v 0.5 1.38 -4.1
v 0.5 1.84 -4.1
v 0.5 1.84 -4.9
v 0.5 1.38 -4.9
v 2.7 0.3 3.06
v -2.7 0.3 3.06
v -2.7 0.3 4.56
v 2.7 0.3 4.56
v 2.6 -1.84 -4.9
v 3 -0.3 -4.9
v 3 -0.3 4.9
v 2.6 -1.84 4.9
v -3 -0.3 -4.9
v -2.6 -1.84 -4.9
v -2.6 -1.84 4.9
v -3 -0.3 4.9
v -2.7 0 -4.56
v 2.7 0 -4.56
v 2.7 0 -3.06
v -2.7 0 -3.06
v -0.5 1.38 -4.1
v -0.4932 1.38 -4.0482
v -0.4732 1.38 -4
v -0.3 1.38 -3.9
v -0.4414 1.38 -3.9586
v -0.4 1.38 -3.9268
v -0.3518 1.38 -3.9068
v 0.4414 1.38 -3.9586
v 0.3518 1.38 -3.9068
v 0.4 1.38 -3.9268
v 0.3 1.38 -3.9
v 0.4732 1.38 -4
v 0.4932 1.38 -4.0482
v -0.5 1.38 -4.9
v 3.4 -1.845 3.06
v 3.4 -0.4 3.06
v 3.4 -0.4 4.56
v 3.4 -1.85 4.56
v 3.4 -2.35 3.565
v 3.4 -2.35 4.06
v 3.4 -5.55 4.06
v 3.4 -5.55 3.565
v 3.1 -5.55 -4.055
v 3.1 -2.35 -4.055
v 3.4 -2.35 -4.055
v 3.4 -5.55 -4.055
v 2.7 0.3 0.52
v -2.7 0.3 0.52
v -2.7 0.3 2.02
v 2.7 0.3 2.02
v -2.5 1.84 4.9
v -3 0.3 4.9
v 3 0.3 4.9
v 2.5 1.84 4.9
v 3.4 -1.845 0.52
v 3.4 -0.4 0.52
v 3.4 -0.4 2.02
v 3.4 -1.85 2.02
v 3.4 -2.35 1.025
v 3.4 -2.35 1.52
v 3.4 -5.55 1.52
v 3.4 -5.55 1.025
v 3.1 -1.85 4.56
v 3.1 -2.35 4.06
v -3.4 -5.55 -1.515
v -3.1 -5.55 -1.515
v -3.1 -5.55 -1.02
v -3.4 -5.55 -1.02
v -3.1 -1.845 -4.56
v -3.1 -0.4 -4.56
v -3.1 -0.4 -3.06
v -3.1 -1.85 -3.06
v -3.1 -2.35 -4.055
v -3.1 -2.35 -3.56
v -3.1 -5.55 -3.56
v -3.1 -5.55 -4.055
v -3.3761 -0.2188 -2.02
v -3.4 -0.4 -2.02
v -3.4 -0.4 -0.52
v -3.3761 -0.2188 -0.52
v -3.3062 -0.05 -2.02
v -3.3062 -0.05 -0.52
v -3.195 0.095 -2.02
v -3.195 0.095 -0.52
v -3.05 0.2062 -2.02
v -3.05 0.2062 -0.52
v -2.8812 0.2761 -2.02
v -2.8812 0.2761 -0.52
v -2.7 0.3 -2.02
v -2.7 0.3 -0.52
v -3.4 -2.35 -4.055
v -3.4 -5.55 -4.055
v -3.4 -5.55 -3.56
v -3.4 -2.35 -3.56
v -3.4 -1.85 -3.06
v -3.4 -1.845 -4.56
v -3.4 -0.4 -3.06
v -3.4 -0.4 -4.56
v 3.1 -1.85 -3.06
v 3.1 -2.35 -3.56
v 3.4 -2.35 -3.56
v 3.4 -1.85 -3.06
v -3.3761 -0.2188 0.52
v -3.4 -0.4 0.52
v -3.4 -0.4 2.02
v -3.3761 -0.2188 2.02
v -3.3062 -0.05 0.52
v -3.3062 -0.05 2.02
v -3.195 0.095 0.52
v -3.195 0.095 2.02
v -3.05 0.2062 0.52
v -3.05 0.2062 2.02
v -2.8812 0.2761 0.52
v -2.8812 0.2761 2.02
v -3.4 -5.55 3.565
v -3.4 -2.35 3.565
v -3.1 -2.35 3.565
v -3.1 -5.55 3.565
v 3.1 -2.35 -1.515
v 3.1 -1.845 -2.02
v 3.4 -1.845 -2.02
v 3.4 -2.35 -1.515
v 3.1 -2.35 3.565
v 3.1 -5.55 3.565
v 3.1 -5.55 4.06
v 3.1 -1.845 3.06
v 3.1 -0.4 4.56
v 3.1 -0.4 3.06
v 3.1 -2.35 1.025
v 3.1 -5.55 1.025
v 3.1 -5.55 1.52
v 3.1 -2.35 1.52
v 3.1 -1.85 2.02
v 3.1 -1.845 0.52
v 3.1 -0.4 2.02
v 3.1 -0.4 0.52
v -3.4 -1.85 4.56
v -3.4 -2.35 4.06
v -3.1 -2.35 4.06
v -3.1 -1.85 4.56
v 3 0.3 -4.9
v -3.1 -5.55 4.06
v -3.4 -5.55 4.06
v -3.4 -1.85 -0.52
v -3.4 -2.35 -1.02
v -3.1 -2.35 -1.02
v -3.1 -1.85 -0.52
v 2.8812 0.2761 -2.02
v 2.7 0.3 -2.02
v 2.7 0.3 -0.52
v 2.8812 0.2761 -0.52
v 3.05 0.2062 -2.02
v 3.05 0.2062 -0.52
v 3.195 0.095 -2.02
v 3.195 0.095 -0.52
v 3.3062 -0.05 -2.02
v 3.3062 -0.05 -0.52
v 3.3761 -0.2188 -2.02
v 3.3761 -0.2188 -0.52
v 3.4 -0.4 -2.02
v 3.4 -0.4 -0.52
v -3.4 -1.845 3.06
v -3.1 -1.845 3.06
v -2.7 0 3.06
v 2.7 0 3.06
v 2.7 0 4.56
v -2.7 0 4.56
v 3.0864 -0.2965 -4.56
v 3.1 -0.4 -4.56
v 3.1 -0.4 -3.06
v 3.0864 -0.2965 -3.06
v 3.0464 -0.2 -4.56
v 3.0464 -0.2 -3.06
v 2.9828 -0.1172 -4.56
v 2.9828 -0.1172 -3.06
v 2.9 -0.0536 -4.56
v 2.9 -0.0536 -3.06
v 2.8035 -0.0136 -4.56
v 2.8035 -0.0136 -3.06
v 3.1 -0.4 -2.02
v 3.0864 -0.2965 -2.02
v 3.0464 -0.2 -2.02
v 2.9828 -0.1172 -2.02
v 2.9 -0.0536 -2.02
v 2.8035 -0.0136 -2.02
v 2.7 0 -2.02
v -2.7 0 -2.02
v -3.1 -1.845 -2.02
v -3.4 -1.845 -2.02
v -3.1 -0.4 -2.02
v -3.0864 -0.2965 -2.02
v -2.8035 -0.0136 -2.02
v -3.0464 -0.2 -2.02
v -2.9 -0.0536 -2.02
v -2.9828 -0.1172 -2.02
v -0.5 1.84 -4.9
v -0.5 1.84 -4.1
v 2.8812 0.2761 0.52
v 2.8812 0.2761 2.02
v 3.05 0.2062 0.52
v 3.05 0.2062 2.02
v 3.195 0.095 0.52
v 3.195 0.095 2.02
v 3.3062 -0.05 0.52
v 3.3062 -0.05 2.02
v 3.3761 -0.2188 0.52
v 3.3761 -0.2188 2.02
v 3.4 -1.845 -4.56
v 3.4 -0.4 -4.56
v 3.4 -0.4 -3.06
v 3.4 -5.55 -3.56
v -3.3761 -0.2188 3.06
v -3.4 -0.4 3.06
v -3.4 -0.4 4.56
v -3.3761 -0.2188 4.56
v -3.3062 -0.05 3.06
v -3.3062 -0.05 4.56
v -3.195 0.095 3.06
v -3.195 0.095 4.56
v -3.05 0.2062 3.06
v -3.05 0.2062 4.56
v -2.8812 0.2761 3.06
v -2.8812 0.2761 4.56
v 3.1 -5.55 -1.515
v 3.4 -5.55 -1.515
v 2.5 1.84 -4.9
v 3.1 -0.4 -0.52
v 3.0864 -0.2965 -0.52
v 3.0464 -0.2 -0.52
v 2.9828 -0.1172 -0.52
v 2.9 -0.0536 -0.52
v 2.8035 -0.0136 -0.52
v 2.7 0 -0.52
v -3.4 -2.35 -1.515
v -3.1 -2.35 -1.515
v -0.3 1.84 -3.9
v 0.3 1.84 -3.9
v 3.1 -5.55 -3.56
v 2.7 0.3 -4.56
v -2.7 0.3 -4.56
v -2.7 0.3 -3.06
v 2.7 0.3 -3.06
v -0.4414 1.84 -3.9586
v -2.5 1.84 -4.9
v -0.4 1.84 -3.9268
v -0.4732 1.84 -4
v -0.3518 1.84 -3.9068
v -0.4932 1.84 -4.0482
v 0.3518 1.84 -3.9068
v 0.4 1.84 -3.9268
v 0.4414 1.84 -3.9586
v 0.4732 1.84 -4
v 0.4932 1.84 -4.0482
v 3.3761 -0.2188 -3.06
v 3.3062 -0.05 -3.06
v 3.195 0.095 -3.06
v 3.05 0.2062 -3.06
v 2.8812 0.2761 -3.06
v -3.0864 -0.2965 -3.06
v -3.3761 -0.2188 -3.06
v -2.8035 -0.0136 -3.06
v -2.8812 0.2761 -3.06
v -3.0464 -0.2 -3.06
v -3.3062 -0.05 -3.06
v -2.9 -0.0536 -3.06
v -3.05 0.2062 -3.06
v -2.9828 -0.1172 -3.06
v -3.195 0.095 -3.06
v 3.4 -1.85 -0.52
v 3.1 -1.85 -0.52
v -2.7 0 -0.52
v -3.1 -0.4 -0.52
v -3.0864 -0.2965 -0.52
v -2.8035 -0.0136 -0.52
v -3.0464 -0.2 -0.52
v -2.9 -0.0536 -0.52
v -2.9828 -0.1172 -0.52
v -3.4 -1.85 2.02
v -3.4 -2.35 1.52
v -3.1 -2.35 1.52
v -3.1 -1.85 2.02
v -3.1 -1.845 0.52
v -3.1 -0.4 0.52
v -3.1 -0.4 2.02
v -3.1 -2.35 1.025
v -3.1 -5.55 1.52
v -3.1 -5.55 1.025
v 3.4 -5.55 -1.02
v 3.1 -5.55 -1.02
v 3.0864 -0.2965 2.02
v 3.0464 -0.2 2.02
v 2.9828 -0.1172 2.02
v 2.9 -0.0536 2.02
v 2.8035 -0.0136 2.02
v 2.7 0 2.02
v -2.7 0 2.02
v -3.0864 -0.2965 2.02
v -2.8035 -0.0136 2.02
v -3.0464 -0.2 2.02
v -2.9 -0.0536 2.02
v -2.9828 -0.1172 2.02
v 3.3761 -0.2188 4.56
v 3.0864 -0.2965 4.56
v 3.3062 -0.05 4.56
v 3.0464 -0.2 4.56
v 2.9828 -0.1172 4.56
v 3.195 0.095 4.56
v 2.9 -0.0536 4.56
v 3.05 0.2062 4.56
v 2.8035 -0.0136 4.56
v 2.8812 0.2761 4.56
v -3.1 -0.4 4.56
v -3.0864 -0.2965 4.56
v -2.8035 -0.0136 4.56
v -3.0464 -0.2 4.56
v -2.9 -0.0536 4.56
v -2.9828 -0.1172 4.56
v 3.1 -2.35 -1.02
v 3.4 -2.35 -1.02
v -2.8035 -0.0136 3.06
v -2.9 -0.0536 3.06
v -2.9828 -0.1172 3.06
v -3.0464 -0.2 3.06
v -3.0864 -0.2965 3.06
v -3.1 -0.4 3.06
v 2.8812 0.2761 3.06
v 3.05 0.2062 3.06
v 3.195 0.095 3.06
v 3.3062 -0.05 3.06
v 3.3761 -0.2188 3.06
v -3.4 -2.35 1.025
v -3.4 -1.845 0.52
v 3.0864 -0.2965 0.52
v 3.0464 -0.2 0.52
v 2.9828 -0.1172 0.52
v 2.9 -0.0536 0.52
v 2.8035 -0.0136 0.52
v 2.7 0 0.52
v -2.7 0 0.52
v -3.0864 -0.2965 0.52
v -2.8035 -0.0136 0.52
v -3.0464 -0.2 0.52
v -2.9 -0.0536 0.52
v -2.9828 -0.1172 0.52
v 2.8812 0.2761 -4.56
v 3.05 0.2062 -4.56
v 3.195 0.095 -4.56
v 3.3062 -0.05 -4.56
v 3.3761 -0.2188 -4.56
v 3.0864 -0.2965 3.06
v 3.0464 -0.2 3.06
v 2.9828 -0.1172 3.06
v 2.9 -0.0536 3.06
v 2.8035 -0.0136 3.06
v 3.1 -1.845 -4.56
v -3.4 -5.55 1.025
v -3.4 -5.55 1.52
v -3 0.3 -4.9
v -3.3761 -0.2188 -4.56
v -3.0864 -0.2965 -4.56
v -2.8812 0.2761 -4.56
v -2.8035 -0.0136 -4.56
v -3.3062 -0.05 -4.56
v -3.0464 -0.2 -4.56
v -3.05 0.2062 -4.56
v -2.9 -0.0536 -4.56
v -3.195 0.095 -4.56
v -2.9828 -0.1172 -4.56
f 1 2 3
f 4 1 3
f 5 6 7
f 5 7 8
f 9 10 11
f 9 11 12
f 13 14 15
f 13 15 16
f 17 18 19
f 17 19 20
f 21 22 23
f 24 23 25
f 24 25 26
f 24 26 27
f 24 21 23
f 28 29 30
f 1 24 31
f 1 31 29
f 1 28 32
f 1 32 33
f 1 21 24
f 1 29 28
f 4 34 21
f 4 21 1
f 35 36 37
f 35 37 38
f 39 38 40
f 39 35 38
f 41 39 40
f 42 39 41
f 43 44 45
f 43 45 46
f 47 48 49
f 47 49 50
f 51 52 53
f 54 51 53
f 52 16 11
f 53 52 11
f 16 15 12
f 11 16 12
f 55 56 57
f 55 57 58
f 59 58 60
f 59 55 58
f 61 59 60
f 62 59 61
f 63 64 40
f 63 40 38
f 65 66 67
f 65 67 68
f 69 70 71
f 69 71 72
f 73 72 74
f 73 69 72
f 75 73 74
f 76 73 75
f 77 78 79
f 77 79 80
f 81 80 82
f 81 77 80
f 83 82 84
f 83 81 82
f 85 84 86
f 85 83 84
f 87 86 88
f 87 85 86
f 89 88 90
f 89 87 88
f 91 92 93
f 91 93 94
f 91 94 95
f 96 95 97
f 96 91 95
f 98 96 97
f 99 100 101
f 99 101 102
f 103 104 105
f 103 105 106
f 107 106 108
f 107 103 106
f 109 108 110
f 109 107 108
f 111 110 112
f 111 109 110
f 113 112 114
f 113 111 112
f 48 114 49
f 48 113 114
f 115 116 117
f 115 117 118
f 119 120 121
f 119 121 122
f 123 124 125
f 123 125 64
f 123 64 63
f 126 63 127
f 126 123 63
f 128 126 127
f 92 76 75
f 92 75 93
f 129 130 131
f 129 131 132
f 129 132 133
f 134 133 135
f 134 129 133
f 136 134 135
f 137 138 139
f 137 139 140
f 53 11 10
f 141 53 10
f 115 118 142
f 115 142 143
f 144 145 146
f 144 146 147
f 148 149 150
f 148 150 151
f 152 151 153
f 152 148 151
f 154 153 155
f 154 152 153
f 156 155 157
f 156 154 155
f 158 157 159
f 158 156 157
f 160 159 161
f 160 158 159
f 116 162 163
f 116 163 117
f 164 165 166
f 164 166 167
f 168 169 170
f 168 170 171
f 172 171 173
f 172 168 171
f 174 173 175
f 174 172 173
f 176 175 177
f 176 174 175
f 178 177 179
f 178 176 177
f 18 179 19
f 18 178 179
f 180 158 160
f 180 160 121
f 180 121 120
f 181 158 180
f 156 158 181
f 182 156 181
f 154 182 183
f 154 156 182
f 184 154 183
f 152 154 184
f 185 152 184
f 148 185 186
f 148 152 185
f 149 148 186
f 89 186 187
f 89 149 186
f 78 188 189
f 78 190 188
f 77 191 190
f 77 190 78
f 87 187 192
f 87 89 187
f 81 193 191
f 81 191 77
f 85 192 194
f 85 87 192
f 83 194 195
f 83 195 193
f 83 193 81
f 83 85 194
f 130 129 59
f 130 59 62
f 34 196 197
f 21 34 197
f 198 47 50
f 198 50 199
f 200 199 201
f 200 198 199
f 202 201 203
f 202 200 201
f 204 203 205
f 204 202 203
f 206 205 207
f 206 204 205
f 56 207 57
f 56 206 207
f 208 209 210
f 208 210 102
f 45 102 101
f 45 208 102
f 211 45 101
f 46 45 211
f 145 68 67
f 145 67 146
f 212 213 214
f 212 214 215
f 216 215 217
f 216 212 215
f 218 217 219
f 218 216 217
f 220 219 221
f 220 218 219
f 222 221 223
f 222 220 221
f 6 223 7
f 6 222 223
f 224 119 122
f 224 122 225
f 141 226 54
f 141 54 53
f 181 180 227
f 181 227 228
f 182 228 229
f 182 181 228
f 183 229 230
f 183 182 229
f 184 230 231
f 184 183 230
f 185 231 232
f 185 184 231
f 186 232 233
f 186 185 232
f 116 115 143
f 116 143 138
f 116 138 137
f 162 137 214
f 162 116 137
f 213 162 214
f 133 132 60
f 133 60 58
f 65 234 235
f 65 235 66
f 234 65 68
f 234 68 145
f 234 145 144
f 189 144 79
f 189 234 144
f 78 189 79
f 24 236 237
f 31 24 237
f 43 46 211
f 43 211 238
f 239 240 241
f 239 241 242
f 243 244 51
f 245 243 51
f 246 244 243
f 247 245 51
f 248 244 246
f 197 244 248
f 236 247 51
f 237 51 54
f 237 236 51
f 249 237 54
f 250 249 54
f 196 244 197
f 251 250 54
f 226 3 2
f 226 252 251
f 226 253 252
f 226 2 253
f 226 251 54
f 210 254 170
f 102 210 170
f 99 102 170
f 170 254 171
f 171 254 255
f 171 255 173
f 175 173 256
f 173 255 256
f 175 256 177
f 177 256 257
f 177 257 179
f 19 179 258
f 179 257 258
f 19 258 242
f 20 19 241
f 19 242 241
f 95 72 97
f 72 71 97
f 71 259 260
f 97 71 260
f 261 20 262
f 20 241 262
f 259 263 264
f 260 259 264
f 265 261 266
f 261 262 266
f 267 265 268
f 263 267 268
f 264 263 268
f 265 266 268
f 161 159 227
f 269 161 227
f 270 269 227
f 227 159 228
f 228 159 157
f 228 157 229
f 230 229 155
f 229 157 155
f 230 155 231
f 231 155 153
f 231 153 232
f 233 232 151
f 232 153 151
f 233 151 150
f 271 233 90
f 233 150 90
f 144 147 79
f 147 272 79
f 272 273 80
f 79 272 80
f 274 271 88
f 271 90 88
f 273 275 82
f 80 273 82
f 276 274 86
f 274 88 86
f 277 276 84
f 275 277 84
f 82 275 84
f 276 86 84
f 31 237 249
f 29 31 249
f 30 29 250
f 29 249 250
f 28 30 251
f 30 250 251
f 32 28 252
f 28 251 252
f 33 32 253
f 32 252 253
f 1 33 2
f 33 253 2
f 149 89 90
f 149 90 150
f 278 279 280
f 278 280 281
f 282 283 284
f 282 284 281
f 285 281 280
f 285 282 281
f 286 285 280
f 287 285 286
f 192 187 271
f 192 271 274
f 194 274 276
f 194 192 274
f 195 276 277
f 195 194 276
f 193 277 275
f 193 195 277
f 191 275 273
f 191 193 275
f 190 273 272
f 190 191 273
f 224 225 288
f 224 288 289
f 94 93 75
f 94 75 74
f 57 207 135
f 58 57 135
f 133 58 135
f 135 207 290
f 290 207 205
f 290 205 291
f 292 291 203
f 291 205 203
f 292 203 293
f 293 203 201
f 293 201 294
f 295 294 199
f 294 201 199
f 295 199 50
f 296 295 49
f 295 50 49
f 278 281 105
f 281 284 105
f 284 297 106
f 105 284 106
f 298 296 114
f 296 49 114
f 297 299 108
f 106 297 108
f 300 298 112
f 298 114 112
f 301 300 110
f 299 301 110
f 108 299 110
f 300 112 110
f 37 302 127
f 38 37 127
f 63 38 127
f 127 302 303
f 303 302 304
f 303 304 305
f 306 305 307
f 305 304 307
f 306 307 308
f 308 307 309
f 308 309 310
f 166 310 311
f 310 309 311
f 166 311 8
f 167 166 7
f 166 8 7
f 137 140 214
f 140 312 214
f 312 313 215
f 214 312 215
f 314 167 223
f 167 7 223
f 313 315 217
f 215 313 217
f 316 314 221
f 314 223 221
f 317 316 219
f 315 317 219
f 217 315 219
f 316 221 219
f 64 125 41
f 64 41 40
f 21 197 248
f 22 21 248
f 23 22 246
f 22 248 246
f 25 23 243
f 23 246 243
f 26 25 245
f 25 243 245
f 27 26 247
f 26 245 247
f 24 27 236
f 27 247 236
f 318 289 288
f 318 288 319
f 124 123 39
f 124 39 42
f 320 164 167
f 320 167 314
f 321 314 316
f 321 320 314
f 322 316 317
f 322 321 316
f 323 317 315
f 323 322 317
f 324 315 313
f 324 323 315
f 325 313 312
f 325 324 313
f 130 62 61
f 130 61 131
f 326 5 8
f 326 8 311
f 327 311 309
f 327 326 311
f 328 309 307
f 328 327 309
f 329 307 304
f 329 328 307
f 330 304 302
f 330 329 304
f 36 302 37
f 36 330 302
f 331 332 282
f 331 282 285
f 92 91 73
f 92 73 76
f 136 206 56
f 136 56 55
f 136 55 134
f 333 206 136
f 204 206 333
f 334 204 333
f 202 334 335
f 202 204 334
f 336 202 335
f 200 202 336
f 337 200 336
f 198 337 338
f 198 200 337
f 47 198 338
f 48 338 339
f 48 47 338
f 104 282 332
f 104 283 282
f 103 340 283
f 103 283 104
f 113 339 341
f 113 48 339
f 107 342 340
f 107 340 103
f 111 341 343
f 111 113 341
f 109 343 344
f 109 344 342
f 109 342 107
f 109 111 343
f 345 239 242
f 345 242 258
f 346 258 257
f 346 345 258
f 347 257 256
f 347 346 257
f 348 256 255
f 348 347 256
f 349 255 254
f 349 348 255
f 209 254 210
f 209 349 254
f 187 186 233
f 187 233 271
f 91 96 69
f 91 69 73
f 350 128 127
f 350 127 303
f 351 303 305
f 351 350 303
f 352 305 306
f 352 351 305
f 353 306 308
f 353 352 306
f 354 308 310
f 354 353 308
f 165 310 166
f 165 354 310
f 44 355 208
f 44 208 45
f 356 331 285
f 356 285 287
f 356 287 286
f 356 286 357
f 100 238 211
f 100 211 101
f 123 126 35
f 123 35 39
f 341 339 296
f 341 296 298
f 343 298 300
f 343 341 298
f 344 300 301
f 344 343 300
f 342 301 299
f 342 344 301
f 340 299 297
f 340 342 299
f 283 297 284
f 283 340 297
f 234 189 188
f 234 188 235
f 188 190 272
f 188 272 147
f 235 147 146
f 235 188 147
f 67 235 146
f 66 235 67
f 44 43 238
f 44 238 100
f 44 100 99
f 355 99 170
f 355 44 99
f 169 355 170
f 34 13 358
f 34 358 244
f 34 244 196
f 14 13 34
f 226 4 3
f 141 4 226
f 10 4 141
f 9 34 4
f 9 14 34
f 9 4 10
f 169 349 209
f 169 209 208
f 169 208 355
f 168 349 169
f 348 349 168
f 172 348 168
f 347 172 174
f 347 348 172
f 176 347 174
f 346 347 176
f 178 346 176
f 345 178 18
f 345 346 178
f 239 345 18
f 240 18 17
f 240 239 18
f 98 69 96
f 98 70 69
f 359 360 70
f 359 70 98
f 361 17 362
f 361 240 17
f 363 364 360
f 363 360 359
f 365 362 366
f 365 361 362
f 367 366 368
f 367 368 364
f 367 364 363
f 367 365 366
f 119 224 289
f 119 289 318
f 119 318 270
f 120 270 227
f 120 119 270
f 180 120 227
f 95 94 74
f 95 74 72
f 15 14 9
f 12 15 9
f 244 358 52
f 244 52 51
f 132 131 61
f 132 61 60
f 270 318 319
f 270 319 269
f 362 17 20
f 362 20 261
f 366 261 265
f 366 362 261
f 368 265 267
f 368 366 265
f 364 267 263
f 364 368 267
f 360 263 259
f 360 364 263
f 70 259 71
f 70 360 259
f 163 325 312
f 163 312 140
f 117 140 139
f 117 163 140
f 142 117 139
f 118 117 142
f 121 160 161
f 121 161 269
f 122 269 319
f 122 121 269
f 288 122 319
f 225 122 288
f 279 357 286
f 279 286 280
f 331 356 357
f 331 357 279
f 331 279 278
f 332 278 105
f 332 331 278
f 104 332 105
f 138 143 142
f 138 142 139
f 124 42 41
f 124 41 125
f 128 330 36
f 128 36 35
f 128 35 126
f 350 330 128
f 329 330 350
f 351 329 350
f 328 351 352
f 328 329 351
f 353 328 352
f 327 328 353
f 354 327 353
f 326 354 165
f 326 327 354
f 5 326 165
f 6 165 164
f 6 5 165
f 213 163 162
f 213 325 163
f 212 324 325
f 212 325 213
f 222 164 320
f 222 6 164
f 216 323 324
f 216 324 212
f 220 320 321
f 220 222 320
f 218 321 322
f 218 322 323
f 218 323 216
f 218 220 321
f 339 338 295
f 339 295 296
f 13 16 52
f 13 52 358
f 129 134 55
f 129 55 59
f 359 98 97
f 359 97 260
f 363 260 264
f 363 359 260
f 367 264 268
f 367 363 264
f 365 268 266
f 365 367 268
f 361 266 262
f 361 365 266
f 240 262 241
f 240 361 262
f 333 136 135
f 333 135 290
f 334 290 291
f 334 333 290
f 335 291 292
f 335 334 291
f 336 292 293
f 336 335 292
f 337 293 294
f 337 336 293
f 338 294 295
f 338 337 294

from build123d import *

# Parameters (mm, degrees)
BODY_FEATURE_DEPTH                    = 1.84
BODY_FEATURE_DEPTH_BACK               = 1.84
SKETCH1_W                             = 6
SKETCH1_H                             = 9.8
BEVEL_FEATURE_DEPTH                   = 9.8
BEVEL_FEATURE_DEPTH_BACK              = 9.8
SIGN_FEATURE_DEPTH                    = 0.46
FIRST_AND_LAST_PIN_FEATURE_DEPTH      = 0.75
FIRST_AND_LAST_PIN_FEATURE_DEPTH_BACK = 0.75
PIN_PROFILE_FEATURE_DEPTH             = 10
PIN_PROFILE_FEATURE_DEPTH_BACK        = 10
OTHER_PINS_FEATURE_COUNT              = 4
OTHER_PINS_FEATURE_PITCH              = 2.54


# Sheet-metal steps are written as plain solids
with BuildPart() as part:
    # Sketch1 → Body Feature (new, two sides: drawn at the far end of the back side and taken through both)
    with BuildSketch(Plane(origin=(0, 0, 0), x_dir=(1, 0, 0), z_dir=(0, 1, 0)).offset(-BODY_FEATURE_DEPTH_BACK)):
        Rectangle(SKETCH1_W, SKETCH1_H)
    extrude(amount=BODY_FEATURE_DEPTH + BODY_FEATURE_DEPTH_BACK)

    # Sketch2 → Bevel Feature (cut, two sides: drawn at the far end of the back side and taken through both)
    with BuildSketch(Plane.XY.offset(-BEVEL_FEATURE_DEPTH_BACK)):
        Polygon((-13, 1.882711437), (-9.767114103, 11.84), (9.767114103, 11.84), (13, 1.882711437), (13, -1.577506206), (10.334417196, -11.84), (-10.334417196, -11.84), (-13, -1.577506206), align=None)
        Polygon((-3, 0.3), (-2.5, 1.84), (2.5, 1.84), (3, 0.3), (3, -0.3), (2.6, -1.84), (-2.6, -1.84), (-3, -0.3), align=None, mode=Mode.SUBTRACT)
    extrude(amount=BEVEL_FEATURE_DEPTH + BEVEL_FEATURE_DEPTH_BACK, mode=Mode.SUBTRACT)

    # Sketch3 → Sign Feature (cut)
    with BuildSketch(Plane(origin=(0, 1.84, 0), x_dir=(1, 0, 0), z_dir=(0, 1, 0))):
        with BuildLine():
            Line((-0.3, 3.9), (0.3, 3.9))
            ThreePointArc((0.3, 3.9), (0.441421356, 3.958578644), (0.5, 4.1))
            Line((0.5, 4.1), (0.5, 5.7))
            ThreePointArc((0.5, 5.7), (0.441421356, 5.841421356), (0.3, 5.9))
            Line((0.3, 5.9), (-0.3, 5.9))
            ThreePointArc((-0.3, 5.9), (-0.441421356, 5.841421356), (-0.5, 5.7))
            Line((-0.5, 5.7), (-0.5, 4.1))
            ThreePointArc((-0.5, 4.1), (-0.441421356, 3.958578644), (-0.3, 3.9))
        make_face()
    extrude(amount=-SIGN_FEATURE_DEPTH, mode=Mode.SUBTRACT)


with BuildPart() as body_2:
    # Sketch4 → First and Last Pin Feature (new, two sides: drawn at the far end of the back side and taken through both)
    with BuildSketch(Plane.XY.offset(-3.81).offset(-FIRST_AND_LAST_PIN_FEATURE_DEPTH_BACK)):
        with BuildLine():
            Line((-3.4, -5.55), (-3.4, -0.4))
            ThreePointArc((-3.4, -0.4), (-3.194974747, 0.094974747), (-2.7, 0.3))
            Line((-2.7, 0.3), (2.7, 0.3))
            ThreePointArc((2.7, 0.3), (3.194974747, 0.094974747), (3.4, -0.4))
            Line((3.4, -0.4), (3.4, -5.55))
            Line((3.4, -5.55), (3.1, -5.55))
            Line((3.1, -5.55), (3.1, -0.4))
            ThreePointArc((3.1, -0.4), (2.982842712, -0.117157288), (2.7, 0))
            Line((2.7, 0), (-2.7, 0))
            ThreePointArc((-2.7, 0), (-2.982842712, -0.117157288), (-3.1, -0.4))
            Line((-3.1, -0.4), (-3.1, -5.55))
            Line((-3.1, -5.55), (-3.4, -5.55))
        make_face()
    extrude(amount=FIRST_AND_LAST_PIN_FEATURE_DEPTH + FIRST_AND_LAST_PIN_FEATURE_DEPTH_BACK)

    # Sketch9 → Pin Profile Feature (cut, two sides: drawn at the far end of the back side and taken through both)
    with BuildSketch(Plane(origin=(0, 0, 0), x_dir=(0, 0, -1), z_dir=(1, 0, 0)).offset(-PIN_PROFILE_FEATURE_DEPTH_BACK)):
        Polygon((3.56, -5.55), (3.56, -2.35), (3.055, -1.845), (3.055, -6.55), (4.56, -6.55), (4.56, -1.845), (4.055, -2.35), (4.055, -5.55), align=None)
    extrude(amount=PIN_PROFILE_FEATURE_DEPTH + PIN_PROFILE_FEATURE_DEPTH_BACK, mode=Mode.SUBTRACT)


with BuildPart() as other_pins_feature_1:
    # Other Pins Feature: pattern copy
    add(body_2.part.moved(Location(Vector(0, 0, 1) * (1 * OTHER_PINS_FEATURE_PITCH))))


with BuildPart() as other_pins_feature_2:
    # Other Pins Feature: pattern copy
    add(body_2.part.moved(Location(Vector(0, 0, 1) * (2 * OTHER_PINS_FEATURE_PITCH))))


with BuildPart() as other_pins_feature_3:
    # Other Pins Feature: pattern copy
    add(body_2.part.moved(Location(Vector(0, 0, 1) * (3 * OTHER_PINS_FEATURE_PITCH))))


solid = Compound([part.part, body_2.part, other_pins_feature_1.part, other_pins_feature_2.part, other_pins_feature_3.part])
